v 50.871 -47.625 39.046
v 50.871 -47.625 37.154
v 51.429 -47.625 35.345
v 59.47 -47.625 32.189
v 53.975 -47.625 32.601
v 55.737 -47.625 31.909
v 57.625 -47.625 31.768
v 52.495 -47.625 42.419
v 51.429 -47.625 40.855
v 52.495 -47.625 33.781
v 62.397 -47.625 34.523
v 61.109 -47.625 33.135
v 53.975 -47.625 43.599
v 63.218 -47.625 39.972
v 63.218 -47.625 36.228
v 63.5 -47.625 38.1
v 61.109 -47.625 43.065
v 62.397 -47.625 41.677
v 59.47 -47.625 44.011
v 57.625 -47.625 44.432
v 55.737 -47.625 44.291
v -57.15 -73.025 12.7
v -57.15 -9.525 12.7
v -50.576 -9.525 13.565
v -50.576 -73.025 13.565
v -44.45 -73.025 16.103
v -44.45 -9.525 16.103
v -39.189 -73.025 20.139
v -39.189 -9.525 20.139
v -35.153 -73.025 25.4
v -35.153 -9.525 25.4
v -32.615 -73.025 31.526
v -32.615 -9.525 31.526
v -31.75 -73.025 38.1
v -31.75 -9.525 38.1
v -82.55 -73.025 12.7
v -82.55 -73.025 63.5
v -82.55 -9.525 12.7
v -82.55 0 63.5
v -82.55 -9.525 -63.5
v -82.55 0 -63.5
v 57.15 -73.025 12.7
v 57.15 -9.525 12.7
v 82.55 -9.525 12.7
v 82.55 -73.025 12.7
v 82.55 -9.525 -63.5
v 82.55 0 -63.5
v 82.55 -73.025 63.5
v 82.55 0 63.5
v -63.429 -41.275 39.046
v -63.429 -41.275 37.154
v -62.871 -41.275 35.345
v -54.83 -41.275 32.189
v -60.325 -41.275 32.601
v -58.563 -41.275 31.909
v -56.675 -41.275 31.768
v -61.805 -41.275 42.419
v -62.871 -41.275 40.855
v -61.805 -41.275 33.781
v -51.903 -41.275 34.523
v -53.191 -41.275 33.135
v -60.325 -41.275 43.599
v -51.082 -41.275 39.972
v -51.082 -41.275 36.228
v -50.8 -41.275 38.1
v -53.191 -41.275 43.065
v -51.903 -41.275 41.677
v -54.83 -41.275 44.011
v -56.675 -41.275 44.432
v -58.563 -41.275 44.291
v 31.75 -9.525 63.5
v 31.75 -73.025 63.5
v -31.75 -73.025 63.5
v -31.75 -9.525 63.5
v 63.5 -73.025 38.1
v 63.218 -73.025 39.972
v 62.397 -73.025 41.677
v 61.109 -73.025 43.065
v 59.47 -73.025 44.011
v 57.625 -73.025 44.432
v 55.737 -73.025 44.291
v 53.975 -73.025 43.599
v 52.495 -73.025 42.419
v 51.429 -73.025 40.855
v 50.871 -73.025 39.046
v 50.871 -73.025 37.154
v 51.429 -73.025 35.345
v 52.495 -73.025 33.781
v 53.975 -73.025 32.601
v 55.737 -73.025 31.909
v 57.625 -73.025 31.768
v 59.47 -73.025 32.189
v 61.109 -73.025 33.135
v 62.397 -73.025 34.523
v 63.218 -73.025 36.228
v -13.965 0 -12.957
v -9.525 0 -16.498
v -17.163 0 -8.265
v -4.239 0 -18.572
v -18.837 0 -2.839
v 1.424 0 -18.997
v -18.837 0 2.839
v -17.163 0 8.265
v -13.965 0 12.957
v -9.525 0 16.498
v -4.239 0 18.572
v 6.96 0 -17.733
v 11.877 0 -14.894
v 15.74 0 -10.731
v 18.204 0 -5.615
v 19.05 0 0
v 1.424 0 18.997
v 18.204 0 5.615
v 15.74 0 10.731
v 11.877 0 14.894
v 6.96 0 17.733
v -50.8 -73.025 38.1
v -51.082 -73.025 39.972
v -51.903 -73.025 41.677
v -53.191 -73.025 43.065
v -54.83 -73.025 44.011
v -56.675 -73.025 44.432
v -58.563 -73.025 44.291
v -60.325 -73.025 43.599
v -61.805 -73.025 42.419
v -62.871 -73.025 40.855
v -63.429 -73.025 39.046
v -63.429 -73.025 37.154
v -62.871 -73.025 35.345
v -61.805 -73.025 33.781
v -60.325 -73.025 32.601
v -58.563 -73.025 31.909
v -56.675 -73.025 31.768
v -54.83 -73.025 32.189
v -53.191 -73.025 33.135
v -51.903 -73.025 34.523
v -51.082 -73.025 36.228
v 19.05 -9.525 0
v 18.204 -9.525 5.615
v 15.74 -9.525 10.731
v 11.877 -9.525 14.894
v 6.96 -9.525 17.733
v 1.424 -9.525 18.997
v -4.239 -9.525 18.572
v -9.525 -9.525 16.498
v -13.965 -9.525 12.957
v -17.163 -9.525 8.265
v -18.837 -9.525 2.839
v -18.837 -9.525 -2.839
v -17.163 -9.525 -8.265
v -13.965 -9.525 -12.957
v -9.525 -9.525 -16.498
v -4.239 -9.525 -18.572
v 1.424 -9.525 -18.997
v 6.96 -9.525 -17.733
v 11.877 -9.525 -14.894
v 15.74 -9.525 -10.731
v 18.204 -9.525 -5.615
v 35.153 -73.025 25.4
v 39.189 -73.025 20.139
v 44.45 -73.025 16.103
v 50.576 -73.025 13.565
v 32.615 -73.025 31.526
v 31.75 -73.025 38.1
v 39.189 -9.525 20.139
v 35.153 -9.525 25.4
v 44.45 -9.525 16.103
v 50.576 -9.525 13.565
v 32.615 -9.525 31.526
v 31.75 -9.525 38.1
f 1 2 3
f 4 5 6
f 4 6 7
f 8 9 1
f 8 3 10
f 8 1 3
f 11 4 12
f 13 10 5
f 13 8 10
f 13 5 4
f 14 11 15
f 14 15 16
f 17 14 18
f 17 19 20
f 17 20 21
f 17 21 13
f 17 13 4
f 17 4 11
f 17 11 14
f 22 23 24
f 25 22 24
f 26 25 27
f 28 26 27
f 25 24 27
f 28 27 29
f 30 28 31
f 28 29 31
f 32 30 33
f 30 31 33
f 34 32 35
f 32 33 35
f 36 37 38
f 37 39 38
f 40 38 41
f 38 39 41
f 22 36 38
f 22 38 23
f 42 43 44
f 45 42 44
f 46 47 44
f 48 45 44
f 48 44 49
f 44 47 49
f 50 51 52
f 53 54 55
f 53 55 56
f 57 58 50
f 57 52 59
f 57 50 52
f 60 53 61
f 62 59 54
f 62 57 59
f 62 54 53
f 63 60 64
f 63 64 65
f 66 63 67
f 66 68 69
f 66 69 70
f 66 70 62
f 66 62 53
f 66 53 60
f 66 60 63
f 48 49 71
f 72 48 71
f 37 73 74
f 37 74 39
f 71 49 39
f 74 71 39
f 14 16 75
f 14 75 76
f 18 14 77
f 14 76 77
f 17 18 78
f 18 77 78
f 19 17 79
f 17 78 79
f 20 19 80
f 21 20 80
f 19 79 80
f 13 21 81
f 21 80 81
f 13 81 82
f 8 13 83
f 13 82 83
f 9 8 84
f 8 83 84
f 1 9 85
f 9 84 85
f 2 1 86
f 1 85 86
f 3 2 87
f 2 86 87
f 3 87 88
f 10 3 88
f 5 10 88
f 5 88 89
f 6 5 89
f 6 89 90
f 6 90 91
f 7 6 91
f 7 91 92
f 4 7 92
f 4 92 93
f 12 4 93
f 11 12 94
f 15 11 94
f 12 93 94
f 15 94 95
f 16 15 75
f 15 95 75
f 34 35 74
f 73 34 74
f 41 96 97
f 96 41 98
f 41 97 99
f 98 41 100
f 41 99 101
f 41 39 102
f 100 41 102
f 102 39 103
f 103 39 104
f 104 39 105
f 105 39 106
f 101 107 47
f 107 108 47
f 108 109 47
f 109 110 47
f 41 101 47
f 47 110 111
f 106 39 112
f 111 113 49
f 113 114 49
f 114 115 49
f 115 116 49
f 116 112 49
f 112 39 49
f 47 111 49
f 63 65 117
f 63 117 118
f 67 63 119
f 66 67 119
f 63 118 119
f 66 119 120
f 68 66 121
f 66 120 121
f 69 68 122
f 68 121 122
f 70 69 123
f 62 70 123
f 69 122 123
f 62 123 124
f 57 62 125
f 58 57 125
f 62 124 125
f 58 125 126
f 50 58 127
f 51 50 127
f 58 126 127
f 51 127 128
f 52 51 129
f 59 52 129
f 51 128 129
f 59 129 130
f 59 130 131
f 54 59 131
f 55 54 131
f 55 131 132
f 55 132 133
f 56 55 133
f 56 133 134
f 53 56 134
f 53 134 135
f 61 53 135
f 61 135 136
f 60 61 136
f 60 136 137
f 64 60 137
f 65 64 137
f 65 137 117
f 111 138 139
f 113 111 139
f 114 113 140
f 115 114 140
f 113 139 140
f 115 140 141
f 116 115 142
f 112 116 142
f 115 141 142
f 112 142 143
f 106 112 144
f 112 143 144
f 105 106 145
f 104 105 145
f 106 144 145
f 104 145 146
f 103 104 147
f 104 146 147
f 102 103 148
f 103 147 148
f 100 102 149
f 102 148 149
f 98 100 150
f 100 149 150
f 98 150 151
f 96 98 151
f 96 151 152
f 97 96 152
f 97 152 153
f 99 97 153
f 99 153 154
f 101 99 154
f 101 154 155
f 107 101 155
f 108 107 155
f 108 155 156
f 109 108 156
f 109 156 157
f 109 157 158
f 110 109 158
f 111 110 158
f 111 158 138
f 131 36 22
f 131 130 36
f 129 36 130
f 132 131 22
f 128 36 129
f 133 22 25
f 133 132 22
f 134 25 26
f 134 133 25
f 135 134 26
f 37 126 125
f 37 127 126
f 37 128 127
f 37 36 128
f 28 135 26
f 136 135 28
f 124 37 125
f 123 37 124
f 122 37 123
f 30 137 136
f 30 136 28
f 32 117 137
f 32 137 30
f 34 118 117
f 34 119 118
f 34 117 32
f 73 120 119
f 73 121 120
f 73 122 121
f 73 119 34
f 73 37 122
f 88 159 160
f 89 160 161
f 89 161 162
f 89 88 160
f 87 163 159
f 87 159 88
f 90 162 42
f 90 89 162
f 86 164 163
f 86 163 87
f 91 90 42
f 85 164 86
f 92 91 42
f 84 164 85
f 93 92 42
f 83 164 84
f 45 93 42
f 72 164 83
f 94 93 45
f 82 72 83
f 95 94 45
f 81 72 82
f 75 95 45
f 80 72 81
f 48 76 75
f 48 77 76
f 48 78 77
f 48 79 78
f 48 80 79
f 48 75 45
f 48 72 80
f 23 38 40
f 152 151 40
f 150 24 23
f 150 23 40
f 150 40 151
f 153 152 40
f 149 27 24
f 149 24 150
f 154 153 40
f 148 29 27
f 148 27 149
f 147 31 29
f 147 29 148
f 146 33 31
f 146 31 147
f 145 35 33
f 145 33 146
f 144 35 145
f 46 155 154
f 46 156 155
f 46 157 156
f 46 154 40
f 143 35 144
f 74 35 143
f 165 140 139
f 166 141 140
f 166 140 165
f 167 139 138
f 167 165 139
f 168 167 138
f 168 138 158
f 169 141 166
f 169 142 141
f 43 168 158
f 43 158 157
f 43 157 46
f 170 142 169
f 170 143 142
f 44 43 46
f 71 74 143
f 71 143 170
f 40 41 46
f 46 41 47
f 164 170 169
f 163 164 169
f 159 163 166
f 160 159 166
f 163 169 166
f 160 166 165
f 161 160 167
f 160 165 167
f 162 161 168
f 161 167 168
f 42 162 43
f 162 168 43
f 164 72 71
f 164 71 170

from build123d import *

# Parameters (mm, degrees)
F1_DEPTH  = 9.525
F3_DEPTH  = 63.5
F4_R      = 19.05
F5_DEPTH  = 9.526
F6_R      = 6.35
F7_DEPTH  = 31.75
F8_DEPTH  = 25.4
F9_R      = 6.35
F10_DEPTH = 25.4


with BuildPart() as f1:
    # F0 (on Front) → F1 (new body)
    with BuildSketch(Plane.XZ):
        with BuildLine():
            Line((-82.55, 12.7), (-82.55, -63.5))
            Line((-82.55, -63.5), (82.55, -63.5))
            Line((82.55, -63.5), (82.55, 0.801746))
            Line((82.55, 0.801746), (82.55, 12.7))
            Line((82.55, 12.7), (57.15, 12.7))
            ThreePointArc((57.15, 12.7), (39.189488, 20.139488), (31.75, 38.1))
            Line((31.75, 38.1), (31.75, 63.5))
            Line((31.75, 63.5), (-6.35, 63.5))
            Line((-6.35, 63.5), (-31.75, 63.5))
            Line((-31.75, 63.5), (-31.75, 38.1))
            ThreePointArc((-31.75, 38.1), (-39.189488, 20.139488), (-57.15, 12.7))
            Line((-57.15, 12.7), (-82.55, 12.7))
        make_face()
        with BuildLine():
            Line((-82.55, 20.29972), (-82.55, 12.7))
            Line((-82.55, 12.7), (-57.15, 12.7))
            ThreePointArc((-57.15, 12.7), (-39.189488, 20.139488), (-31.75, 38.1))
            Line((-31.75, 38.1), (-31.75, 63.5))
            Line((-31.75, 63.5), (-82.55, 63.5))
            Line((-82.55, 63.5), (-82.55, 20.29972))
        make_face()
        with BuildLine():
            Line((57.15, 12.7), (82.55, 12.7))
            Line((82.55, 12.7), (82.55, 63.5))
            Line((82.55, 63.5), (34.184467, 63.5))
            Line((34.184467, 63.5), (31.75, 63.5))
            Line((31.75, 63.5), (31.75, 38.1))
            ThreePointArc((31.75, 38.1), (39.189488, 20.139488), (57.15, 12.7))
        make_face()
    extrude(amount=F1_DEPTH)

    # F2 (on face) → F3 (join)
    with BuildSketch(Plane.XZ.offset(9.525)):
        with BuildLine():
            Line((-31.75, 63.5), (-82.55, 63.5))
            Line((-82.55, 63.5), (-82.55, 12.7))
            Line((-82.55, 12.7), (-57.15, 12.7))
            ThreePointArc((-57.15, 12.7), (-39.189488, 20.139488), (-31.75, 38.1))
            Line((-31.75, 38.1), (-31.75, 63.5))
        make_face()
        with BuildLine():
            Line((82.55, 12.7), (82.55, 63.5))
            Line((82.55, 63.5), (31.75, 63.5))
            Line((31.75, 63.5), (31.75, 38.1))
            ThreePointArc((31.75, 38.1), (39.189488, 20.139488), (57.15, 12.7))
            Line((57.15, 12.7), (82.55, 12.7))
        make_face()
    extrude(amount=F3_DEPTH)

    # F4 (on face) → F5 (cut, through all)
    with BuildSketch(Plane.XZ.offset(9.525)):
        Circle(F4_R)
    extrude(amount=-F5_DEPTH, mode=Mode.SUBTRACT)

    # F6 (on face) → F7 (cut)
    with BuildSketch(Plane.XZ.offset(73.025)):
        with Locations((-57.15, 38.1)):
            Circle(F6_R)
    extrude(amount=-F7_DEPTH, mode=Mode.SUBTRACT)

    # F6 (on face) → F8 (cut)
    with BuildSketch(Plane.XZ.offset(73.025)):
        with Locations((-57.15, 38.1)):
            Circle(F6_R)
    extrude(amount=-F8_DEPTH, mode=Mode.SUBTRACT)

    # F9 (on face) → F10 (cut)
    with BuildSketch(Plane.XZ.offset(73.025)):
        with Locations((57.15, 38.1)):
            Circle(F9_R)
    extrude(amount=-F10_DEPTH, mode=Mode.SUBTRACT)


solid = f1.part
